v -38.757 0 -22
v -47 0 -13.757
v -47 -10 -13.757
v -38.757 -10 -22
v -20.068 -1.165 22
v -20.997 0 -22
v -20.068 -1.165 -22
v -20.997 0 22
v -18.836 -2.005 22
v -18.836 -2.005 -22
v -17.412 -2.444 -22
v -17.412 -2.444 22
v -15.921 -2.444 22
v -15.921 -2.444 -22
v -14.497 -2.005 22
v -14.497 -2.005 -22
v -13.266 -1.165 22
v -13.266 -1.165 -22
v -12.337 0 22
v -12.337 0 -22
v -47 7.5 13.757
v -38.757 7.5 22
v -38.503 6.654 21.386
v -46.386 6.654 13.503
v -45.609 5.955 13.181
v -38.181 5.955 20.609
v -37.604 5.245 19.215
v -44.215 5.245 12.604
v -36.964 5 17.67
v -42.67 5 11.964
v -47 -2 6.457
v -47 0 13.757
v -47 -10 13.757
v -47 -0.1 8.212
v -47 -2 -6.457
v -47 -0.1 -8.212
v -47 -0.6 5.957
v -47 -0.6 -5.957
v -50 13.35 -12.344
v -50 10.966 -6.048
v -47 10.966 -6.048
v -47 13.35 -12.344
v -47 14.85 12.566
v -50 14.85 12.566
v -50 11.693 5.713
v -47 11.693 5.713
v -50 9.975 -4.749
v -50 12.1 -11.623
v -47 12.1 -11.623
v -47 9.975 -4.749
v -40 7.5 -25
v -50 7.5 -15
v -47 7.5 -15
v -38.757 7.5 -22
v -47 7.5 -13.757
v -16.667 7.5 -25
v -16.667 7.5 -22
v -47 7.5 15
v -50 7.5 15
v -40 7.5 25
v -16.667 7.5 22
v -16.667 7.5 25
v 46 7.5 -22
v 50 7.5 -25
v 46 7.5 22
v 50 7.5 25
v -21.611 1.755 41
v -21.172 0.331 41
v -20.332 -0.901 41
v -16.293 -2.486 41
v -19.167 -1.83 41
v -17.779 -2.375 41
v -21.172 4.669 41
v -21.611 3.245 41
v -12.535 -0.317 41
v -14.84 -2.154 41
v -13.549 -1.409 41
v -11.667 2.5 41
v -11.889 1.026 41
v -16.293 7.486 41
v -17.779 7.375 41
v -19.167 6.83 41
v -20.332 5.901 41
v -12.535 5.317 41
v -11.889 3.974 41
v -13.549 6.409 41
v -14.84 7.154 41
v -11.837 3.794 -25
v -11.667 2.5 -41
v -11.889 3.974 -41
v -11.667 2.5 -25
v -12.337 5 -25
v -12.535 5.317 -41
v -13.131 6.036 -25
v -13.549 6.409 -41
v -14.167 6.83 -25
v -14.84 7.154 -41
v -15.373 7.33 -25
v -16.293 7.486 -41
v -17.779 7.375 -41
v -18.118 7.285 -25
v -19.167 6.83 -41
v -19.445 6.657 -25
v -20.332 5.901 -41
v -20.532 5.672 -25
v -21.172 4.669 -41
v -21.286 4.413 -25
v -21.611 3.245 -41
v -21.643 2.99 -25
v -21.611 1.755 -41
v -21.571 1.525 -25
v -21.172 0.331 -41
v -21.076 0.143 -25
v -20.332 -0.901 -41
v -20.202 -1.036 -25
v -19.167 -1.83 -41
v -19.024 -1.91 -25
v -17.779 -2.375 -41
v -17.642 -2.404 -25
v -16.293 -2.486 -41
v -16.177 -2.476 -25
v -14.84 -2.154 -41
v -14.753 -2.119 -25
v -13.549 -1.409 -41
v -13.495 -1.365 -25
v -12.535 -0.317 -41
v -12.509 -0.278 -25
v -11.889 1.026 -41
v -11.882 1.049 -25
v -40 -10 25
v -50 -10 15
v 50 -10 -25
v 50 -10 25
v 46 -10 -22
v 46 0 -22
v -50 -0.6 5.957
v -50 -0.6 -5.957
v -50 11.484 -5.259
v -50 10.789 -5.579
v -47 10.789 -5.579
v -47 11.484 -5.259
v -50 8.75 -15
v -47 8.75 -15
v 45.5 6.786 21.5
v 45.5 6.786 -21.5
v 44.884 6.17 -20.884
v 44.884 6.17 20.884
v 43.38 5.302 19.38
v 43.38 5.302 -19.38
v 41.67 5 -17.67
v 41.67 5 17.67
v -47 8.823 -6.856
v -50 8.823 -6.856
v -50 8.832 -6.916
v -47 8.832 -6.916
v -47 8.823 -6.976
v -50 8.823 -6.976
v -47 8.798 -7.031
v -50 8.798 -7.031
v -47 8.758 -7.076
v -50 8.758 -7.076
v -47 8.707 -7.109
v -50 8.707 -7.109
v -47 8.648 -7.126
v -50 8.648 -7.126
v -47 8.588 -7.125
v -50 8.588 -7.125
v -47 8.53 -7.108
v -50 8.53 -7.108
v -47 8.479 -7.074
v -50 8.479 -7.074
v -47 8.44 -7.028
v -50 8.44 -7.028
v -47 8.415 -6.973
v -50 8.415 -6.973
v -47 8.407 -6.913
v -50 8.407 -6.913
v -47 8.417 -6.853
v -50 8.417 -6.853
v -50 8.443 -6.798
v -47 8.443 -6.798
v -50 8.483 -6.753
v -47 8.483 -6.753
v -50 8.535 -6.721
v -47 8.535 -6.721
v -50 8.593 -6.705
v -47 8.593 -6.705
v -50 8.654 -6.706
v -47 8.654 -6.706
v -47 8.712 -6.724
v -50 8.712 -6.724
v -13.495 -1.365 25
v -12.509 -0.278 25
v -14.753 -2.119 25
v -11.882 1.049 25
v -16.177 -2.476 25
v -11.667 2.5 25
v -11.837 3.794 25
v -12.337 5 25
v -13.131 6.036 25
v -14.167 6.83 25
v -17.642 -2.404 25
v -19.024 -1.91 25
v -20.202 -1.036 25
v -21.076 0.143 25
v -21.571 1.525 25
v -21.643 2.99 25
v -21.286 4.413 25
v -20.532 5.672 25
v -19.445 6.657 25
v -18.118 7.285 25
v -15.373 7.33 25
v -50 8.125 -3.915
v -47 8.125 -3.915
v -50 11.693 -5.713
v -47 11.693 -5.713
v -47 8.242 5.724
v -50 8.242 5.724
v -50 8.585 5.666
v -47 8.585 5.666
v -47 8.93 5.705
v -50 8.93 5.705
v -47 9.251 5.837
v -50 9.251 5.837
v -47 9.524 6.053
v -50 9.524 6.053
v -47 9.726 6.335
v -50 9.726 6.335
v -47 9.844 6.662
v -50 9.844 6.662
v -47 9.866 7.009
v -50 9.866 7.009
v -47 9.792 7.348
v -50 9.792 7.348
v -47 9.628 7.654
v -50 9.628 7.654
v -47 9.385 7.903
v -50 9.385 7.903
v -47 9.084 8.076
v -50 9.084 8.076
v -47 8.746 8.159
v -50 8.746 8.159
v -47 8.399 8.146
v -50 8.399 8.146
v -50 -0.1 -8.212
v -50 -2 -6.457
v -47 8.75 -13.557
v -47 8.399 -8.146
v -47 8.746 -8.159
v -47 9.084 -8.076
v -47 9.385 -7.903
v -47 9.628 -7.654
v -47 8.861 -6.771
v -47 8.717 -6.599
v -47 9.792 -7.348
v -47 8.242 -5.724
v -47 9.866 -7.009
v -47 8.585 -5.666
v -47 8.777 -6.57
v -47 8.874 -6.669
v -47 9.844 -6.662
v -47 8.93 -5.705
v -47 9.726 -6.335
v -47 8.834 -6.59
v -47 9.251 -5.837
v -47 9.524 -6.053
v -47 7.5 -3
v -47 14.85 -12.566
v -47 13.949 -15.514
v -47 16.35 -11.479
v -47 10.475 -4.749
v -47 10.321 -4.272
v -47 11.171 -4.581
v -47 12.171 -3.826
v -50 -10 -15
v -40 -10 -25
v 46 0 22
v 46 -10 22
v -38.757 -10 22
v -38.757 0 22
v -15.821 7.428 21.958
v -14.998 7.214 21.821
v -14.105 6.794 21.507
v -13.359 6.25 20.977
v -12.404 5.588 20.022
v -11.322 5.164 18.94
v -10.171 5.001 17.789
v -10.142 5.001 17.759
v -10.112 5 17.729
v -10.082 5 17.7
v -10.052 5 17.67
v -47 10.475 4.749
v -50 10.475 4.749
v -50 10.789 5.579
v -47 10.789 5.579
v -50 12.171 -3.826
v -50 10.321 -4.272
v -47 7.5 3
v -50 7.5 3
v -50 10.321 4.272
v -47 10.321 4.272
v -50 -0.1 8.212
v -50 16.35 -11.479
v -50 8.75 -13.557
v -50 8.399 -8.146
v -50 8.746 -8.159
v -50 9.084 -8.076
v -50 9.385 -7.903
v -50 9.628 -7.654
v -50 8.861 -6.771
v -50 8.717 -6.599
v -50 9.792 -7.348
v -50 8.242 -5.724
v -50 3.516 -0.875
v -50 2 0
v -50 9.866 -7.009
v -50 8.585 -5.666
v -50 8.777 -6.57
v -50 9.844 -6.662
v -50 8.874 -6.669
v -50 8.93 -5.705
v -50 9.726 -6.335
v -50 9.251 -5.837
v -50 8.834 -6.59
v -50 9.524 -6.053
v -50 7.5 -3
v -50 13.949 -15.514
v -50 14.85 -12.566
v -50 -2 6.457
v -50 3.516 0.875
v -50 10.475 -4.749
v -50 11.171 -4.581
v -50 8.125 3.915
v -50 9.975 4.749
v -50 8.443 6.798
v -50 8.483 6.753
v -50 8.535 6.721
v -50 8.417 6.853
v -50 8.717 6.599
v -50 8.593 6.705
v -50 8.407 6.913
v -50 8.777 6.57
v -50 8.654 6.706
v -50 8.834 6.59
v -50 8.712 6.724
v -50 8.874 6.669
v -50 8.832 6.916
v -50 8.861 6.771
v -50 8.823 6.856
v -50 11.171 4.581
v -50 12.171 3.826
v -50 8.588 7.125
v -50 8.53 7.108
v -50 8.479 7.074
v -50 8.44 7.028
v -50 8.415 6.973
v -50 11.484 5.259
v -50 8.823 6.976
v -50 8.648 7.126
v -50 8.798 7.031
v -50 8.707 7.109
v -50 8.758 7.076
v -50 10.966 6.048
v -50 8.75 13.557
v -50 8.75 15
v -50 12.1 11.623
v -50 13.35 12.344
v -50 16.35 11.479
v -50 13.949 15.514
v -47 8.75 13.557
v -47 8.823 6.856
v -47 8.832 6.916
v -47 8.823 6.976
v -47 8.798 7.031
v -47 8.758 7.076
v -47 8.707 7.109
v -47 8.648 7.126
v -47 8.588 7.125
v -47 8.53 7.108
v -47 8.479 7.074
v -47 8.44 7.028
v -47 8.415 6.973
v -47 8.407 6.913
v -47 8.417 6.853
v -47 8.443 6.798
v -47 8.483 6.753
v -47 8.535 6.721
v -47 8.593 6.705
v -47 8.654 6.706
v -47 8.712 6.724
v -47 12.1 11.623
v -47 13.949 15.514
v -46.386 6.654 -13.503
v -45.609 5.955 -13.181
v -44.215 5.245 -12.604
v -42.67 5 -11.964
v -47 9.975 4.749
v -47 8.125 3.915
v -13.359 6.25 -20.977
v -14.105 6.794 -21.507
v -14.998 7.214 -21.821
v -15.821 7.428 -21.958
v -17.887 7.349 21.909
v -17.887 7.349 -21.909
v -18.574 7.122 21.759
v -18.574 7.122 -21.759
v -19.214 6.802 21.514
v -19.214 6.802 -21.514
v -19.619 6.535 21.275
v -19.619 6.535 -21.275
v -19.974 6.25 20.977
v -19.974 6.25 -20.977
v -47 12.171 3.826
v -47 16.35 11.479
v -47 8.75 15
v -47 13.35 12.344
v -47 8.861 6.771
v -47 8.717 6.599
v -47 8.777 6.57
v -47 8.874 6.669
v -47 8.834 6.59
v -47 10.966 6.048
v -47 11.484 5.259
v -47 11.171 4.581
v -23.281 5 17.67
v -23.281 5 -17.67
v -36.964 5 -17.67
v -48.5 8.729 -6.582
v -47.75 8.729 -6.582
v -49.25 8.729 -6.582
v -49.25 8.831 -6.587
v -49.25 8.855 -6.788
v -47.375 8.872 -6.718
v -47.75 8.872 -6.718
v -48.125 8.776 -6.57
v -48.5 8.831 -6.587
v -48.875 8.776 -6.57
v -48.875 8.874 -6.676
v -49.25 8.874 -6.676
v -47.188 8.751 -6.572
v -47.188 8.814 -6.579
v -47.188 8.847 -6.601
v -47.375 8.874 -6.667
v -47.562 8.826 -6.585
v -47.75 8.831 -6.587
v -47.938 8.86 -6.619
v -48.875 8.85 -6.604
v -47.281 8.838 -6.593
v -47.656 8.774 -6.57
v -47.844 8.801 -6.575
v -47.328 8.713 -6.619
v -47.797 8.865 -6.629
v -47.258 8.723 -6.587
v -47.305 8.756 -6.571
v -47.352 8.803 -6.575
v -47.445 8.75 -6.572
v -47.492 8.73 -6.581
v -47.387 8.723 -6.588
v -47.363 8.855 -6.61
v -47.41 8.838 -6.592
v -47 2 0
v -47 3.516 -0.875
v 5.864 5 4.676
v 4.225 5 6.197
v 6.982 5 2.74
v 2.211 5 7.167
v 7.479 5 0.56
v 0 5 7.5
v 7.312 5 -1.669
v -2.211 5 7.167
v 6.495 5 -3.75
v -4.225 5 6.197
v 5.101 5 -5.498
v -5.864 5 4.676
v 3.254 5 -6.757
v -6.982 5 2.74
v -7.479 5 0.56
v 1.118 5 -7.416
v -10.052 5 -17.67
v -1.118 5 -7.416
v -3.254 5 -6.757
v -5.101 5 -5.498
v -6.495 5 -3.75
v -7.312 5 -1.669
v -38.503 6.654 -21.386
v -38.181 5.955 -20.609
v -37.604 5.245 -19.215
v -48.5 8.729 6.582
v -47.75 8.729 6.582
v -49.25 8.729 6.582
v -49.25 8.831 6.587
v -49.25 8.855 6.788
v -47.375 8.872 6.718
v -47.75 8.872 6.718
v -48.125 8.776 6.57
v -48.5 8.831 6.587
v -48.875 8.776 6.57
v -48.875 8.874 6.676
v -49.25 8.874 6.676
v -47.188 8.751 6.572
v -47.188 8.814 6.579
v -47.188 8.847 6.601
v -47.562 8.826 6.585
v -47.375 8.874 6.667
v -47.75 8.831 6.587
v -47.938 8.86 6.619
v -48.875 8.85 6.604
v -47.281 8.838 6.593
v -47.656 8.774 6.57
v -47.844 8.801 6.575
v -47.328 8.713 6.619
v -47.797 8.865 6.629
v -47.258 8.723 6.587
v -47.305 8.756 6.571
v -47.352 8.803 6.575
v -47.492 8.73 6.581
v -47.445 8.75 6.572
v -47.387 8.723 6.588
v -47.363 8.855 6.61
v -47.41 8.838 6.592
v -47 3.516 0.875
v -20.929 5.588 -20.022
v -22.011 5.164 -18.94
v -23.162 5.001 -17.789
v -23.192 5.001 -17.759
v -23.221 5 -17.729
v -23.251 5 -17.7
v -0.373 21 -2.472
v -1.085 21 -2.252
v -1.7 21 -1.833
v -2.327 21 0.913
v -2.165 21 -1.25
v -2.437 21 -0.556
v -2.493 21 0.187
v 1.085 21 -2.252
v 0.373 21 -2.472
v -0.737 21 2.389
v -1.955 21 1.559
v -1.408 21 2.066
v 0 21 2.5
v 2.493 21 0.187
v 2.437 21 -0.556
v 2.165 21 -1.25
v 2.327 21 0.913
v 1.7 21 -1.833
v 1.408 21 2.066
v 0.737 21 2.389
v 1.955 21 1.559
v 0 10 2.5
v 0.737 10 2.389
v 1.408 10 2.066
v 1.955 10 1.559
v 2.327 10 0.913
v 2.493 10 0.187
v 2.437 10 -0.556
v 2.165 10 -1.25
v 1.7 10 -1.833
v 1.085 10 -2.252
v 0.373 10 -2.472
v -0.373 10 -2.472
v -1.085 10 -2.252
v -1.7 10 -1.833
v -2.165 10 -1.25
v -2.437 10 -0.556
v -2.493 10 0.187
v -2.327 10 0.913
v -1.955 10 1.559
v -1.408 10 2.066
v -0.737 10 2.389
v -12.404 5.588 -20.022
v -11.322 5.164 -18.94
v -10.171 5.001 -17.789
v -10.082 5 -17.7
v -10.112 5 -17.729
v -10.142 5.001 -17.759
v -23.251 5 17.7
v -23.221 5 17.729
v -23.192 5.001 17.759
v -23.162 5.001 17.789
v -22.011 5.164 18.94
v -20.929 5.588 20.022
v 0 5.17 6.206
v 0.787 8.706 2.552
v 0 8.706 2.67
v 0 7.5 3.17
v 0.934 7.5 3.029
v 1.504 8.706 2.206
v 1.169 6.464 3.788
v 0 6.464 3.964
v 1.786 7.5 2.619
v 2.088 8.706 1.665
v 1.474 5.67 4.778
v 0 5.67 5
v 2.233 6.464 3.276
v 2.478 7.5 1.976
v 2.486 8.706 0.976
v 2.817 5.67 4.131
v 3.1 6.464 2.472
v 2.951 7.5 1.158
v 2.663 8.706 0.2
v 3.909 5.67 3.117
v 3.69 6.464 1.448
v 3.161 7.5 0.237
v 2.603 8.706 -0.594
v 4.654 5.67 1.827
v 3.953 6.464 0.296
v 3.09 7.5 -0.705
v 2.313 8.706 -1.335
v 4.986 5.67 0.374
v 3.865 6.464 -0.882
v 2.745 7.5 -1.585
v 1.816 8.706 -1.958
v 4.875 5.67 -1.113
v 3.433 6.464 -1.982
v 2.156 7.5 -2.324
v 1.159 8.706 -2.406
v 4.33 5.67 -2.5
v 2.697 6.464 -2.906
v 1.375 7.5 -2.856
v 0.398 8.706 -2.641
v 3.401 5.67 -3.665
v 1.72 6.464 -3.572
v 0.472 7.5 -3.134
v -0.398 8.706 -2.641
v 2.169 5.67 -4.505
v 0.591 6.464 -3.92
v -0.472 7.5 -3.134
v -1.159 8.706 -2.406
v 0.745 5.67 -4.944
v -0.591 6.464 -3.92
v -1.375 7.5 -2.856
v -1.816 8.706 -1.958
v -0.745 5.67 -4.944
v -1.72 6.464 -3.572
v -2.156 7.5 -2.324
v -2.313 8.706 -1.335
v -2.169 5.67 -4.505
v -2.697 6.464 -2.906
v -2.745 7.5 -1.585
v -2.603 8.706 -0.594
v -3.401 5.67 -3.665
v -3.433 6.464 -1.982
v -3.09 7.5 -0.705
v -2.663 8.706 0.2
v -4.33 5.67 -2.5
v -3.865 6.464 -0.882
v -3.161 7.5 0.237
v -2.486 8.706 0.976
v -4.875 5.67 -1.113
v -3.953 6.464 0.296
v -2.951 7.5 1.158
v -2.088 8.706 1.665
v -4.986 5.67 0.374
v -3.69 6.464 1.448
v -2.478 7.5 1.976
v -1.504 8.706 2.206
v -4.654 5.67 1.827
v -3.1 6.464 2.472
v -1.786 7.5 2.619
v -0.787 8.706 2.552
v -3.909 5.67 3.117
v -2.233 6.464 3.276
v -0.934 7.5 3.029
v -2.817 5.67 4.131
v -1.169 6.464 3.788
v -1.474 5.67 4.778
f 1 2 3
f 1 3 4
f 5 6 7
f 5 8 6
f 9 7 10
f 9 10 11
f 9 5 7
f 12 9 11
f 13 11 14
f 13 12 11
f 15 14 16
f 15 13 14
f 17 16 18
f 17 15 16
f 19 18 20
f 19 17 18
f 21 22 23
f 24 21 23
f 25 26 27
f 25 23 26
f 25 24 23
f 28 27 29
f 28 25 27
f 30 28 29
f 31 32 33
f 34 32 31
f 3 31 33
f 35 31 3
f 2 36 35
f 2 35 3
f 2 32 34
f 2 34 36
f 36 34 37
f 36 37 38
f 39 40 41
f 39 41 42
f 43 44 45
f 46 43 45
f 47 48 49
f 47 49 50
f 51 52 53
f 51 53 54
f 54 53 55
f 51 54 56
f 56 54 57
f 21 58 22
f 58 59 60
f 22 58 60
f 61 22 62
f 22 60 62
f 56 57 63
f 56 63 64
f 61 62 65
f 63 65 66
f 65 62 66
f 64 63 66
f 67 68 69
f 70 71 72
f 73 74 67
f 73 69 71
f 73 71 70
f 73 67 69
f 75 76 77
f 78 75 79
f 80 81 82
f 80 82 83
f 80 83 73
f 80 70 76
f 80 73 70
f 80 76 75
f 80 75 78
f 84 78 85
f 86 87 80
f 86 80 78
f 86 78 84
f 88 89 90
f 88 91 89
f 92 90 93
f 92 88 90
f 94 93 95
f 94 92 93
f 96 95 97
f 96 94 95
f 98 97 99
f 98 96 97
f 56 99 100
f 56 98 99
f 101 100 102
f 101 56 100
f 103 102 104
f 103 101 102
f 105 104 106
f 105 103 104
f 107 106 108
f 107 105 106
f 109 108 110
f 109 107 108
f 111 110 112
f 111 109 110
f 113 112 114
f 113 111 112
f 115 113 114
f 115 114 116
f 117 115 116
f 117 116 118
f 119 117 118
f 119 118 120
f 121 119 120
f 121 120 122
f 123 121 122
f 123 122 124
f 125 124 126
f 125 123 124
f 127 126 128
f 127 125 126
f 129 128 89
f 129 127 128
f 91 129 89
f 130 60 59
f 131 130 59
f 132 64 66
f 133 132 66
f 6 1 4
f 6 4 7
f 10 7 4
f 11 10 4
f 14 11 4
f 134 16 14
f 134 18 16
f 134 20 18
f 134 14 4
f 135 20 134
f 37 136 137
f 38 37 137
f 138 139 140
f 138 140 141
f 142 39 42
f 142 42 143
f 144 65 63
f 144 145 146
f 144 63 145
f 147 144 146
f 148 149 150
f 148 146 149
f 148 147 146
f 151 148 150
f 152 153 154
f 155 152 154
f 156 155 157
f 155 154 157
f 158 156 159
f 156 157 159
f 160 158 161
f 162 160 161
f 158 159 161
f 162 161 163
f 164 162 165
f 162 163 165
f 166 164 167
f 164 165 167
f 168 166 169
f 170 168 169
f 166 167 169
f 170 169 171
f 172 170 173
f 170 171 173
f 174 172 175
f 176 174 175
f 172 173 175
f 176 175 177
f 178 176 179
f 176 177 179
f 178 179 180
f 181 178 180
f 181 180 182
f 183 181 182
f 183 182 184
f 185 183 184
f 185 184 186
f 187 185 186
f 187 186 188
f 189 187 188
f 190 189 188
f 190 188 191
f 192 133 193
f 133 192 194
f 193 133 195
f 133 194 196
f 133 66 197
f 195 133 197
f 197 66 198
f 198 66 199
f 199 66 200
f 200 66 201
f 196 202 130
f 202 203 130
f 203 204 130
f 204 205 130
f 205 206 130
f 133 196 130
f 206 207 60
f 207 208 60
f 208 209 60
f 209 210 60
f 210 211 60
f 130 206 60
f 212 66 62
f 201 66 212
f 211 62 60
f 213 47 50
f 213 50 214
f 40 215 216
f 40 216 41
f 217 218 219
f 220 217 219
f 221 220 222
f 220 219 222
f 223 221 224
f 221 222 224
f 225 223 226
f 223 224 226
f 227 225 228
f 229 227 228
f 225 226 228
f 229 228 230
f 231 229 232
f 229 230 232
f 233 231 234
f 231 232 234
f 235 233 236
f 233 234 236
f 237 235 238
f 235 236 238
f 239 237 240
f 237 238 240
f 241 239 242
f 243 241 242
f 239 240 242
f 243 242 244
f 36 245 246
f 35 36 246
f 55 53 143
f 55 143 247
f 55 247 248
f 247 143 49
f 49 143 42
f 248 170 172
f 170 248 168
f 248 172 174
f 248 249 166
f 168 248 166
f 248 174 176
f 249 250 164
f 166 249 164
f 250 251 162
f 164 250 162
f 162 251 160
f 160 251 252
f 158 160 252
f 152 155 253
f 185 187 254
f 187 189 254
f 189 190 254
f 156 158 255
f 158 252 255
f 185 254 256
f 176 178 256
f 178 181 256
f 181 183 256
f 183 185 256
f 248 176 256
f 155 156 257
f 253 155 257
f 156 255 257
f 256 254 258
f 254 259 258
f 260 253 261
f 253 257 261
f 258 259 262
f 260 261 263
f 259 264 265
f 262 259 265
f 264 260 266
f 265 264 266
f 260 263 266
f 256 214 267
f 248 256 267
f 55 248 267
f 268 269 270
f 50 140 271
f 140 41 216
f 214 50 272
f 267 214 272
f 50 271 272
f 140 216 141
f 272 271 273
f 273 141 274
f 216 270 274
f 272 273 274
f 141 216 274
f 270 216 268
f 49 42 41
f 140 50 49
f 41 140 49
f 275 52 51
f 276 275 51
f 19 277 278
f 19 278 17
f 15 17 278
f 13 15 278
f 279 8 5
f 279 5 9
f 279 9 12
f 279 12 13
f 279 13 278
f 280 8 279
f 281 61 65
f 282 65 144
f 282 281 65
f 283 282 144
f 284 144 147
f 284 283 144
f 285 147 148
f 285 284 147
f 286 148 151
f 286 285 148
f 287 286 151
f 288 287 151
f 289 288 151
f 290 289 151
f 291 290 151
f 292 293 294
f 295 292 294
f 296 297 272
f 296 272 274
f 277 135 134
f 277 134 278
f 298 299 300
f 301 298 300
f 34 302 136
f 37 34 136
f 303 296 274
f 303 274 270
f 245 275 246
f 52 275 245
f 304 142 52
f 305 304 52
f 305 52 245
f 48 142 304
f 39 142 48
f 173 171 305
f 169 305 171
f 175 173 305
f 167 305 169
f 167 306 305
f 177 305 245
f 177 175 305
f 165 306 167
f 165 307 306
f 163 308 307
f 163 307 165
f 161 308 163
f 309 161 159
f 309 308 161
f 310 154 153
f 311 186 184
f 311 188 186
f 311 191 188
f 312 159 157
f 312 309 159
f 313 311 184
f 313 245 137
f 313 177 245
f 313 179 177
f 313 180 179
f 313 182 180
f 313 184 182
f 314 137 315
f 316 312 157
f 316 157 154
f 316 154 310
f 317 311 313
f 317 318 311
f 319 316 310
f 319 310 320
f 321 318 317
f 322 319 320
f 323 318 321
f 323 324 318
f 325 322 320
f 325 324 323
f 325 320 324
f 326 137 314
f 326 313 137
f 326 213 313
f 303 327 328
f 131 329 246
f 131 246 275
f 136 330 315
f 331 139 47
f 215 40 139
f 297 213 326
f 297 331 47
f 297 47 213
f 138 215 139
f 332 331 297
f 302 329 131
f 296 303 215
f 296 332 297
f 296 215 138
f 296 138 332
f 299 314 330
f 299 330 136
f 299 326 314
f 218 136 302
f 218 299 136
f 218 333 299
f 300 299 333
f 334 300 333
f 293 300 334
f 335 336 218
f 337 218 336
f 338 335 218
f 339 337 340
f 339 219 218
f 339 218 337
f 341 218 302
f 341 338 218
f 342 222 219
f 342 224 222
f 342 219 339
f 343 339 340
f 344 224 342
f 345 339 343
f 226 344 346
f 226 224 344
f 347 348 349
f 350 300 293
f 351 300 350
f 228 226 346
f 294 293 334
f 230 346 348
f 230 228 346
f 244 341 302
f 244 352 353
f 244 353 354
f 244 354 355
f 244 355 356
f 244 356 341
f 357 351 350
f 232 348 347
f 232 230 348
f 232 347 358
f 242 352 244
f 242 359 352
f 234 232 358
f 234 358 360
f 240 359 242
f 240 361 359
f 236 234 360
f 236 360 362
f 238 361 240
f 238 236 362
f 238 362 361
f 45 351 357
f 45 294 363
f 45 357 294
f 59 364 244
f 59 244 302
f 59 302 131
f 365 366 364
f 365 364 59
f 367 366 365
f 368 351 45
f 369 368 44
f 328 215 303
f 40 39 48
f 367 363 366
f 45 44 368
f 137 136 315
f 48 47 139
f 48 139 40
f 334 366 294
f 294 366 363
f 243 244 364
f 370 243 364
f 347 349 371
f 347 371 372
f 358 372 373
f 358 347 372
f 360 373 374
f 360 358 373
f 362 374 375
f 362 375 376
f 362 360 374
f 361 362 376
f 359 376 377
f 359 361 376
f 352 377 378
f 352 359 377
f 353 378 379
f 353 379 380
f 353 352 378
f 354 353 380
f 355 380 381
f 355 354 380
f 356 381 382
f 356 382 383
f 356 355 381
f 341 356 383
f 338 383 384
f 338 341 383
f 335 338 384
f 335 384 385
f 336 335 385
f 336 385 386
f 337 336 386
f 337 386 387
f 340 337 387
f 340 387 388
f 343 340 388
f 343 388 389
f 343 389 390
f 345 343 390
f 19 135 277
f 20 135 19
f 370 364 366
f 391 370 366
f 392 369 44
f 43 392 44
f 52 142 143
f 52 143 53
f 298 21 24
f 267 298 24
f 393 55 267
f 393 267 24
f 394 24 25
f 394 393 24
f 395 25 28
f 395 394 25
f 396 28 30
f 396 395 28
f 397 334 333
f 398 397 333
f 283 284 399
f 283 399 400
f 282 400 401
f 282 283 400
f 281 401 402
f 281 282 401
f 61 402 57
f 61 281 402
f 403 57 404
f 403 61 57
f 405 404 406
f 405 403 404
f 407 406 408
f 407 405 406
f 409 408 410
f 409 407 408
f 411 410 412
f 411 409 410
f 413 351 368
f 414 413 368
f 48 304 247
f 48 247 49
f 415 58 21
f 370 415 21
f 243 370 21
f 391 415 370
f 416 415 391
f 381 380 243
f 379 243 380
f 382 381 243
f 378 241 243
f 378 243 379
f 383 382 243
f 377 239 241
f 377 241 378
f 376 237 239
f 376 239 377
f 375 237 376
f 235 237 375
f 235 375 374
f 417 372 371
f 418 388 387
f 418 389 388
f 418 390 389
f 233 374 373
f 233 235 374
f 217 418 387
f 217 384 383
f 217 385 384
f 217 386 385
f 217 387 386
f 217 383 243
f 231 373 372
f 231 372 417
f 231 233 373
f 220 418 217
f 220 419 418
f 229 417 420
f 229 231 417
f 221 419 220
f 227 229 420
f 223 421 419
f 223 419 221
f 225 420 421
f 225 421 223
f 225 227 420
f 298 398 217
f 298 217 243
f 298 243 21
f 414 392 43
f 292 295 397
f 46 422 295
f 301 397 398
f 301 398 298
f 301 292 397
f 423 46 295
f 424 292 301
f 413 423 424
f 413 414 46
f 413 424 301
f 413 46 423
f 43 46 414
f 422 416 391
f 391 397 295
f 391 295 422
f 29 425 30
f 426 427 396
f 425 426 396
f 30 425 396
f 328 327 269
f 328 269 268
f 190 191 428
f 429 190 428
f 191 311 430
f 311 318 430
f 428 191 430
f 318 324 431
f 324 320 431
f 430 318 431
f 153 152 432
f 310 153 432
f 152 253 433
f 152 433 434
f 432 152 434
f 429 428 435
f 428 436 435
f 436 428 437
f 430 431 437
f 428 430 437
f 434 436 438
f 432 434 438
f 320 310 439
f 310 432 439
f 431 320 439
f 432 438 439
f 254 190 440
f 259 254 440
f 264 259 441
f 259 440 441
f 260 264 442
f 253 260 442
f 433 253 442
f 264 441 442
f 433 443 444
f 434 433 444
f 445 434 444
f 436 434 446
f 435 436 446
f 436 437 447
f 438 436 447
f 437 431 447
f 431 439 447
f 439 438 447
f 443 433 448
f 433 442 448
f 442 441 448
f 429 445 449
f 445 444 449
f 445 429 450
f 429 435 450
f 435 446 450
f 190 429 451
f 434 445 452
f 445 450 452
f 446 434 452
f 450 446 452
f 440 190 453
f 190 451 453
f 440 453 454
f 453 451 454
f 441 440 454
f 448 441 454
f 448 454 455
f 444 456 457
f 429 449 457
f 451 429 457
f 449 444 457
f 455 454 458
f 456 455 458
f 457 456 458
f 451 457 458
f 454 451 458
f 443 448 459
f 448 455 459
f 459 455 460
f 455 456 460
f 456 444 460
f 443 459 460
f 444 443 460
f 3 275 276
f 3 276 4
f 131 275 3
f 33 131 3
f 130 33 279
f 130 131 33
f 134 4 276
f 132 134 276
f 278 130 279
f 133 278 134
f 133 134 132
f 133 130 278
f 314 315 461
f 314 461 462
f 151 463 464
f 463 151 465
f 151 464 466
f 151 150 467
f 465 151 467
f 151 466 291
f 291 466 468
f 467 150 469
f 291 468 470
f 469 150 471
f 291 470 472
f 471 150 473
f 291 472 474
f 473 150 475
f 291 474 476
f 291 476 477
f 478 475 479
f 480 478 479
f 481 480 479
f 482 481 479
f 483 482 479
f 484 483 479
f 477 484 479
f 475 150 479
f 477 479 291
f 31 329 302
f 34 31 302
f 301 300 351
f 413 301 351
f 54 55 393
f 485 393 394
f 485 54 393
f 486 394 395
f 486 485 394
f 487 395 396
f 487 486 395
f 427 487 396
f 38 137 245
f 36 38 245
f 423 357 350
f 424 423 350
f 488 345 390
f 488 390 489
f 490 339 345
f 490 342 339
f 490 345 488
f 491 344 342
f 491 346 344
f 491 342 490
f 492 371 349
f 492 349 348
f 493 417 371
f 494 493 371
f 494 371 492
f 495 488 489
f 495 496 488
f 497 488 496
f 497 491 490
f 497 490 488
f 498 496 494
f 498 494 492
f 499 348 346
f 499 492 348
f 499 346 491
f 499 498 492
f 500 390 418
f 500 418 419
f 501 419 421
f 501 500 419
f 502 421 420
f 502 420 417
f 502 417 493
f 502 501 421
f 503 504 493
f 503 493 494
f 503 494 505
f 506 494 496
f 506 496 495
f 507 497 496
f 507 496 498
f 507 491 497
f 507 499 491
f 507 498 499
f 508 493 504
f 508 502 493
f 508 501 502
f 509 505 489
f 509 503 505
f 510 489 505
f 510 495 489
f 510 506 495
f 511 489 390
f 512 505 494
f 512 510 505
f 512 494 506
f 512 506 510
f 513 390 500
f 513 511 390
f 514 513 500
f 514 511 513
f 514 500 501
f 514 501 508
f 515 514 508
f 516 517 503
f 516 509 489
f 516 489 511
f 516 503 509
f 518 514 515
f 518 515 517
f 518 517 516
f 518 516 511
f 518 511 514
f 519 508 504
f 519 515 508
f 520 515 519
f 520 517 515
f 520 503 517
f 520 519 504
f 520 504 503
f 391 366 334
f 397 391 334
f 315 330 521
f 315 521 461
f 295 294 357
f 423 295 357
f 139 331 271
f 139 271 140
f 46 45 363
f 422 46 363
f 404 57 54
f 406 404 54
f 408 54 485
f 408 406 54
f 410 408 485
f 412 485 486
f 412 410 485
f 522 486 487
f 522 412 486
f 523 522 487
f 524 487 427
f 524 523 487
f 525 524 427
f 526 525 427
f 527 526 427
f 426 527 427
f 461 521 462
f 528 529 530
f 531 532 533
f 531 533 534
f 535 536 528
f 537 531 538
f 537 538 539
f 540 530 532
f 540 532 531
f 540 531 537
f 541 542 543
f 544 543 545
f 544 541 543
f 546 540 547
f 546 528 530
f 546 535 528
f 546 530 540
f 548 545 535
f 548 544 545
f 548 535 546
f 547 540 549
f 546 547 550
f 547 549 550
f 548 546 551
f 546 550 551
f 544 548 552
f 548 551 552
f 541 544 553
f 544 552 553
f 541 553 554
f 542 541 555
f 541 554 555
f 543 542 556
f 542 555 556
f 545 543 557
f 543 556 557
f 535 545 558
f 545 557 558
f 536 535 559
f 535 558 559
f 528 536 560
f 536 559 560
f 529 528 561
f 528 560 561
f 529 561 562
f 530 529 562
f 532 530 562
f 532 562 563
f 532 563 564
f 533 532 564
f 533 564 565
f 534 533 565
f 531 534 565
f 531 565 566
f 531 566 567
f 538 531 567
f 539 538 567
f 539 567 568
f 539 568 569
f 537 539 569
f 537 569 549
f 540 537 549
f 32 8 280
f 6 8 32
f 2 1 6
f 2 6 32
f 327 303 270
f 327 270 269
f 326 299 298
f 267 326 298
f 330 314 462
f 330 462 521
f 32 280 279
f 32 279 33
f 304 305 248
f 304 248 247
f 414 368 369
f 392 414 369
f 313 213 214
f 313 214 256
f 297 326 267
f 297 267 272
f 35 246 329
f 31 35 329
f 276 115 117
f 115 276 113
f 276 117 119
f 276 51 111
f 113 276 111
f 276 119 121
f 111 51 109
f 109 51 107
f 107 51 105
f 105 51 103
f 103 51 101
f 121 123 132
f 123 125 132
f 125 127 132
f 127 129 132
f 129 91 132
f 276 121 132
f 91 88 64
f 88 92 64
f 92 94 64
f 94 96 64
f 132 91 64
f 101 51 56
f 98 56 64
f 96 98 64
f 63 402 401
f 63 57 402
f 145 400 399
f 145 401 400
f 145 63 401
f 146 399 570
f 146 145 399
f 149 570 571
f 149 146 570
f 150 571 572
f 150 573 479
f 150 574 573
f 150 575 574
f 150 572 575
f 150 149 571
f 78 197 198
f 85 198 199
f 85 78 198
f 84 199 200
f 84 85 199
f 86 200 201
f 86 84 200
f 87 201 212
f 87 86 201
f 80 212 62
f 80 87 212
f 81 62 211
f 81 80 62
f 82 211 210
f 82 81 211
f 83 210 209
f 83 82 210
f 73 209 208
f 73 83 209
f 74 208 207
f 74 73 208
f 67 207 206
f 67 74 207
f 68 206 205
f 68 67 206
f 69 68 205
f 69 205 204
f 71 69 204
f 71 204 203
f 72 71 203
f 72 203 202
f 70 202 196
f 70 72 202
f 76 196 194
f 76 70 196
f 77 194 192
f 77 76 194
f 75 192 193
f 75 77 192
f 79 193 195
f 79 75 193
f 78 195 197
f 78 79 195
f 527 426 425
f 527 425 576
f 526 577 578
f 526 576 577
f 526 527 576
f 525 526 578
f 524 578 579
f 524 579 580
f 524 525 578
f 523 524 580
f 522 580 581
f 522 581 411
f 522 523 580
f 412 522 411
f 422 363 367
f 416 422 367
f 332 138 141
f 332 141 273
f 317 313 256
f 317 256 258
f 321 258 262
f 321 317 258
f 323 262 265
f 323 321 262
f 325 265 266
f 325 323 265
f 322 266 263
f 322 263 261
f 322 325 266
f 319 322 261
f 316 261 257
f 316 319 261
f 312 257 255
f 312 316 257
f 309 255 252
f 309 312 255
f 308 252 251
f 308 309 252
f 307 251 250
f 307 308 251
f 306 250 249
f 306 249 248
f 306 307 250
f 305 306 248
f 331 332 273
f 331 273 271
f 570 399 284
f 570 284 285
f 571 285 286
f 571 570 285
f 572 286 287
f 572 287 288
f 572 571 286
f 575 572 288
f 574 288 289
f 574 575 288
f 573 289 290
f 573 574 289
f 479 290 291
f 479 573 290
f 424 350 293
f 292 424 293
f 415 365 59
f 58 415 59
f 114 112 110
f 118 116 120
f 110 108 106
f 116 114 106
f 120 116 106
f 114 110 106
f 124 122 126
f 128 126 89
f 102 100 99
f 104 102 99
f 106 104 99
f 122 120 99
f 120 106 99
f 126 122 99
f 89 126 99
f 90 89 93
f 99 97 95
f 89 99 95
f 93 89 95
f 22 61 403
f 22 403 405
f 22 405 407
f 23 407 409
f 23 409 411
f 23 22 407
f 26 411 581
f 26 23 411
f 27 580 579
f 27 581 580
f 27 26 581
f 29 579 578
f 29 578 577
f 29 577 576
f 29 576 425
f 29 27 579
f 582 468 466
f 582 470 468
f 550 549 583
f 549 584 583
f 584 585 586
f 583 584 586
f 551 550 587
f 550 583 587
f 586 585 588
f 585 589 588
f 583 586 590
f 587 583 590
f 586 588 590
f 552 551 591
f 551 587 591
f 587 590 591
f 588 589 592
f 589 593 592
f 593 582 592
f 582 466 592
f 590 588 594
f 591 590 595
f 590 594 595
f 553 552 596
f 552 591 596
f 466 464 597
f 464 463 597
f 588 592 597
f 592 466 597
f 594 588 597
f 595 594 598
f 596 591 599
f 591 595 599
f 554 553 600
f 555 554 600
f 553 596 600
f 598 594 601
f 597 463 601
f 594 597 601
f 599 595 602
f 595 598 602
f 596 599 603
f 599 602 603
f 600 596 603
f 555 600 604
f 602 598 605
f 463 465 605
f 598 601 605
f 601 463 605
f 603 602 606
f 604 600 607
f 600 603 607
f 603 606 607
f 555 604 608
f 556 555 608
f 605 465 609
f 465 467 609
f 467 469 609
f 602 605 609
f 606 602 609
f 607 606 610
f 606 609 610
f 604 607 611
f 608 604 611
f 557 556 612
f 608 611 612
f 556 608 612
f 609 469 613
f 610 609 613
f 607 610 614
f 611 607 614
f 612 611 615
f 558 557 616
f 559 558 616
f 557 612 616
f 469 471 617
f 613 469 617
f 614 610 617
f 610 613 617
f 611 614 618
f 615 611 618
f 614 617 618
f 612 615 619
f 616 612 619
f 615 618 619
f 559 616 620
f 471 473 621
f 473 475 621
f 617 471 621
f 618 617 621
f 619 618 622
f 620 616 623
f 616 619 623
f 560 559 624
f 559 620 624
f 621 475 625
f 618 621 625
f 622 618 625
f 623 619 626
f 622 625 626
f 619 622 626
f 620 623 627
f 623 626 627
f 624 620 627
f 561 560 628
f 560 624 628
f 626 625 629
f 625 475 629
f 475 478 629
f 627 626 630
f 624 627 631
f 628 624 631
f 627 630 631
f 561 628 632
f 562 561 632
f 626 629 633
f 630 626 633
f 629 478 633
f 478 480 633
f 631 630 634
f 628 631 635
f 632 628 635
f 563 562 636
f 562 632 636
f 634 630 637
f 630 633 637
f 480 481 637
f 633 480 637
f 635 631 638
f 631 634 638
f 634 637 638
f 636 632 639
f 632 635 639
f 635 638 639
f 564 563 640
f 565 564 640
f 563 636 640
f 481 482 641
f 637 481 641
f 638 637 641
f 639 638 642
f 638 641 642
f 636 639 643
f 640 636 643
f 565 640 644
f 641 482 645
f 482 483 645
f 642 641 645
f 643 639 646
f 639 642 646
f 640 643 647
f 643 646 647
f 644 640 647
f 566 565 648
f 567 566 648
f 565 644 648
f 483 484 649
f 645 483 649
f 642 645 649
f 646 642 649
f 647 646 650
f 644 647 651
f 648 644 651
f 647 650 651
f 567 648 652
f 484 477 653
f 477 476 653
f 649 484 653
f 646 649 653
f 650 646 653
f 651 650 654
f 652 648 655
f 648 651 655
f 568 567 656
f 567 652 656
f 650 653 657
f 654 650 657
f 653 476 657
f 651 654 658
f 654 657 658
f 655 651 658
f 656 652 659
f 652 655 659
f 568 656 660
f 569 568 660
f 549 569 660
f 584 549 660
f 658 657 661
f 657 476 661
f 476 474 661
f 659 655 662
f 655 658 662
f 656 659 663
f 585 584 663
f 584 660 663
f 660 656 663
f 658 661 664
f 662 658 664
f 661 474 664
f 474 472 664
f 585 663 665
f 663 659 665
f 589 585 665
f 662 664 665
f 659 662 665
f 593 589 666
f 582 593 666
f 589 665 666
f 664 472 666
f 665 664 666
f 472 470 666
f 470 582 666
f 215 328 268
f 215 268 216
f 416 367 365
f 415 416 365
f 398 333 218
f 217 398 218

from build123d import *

# Parameters (mm, degrees)
SALIENTE_EXTRUIR1_DEPTH       = 5
CROQUIS2_R                    = 5
SALIENTE_EXTRUIR2_DEPTH       = 41
CROQUIS3_R                    = 2.5
SALIENTE_EXTRUIR3_DEPTH       = 16
SALIENTE_EXTRUIR10_DEPTH      = 10
SALIENTE_EXTRUIR10_DEPTH_BACK = 7.5
REDONDEO3_R                   = 5
SALIENTE_EXTRUIR11_DEPTH      = 3
CORTAR_EXTRUIR1_DEPTH         = 3


with BuildPart() as part:
    # Croquis1 → Saliente-Extruir1 (new body)
    with BuildSketch(Plane(origin=(0, 0, 0), x_dir=(1, 0, 0), z_dir=(0, 1, 0))):
        Polygon((-50, 15), (-40, 25), (50, 25), (50, -25), (-40, -25), (-50, -15), align=None)
    extrude(amount=SALIENTE_EXTRUIR1_DEPTH)

    # Croquis2 → Saliente-Extruir2 (add, symmetric)
    with BuildSketch(Plane.XY):
        with Locations((-16.666666667, 2.5)):
            Circle(CROQUIS2_R)
    extrude(amount=SALIENTE_EXTRUIR2_DEPTH, both=True)

    # Croquis3 → Saliente-Extruir3 (add)
    with BuildSketch(Plane(origin=(0, 5, 0), x_dir=(1, 0, 0), z_dir=(0, 1, 0))):
        with Locations(Location((0, 0, 0), (0, 0, 270))):
            Circle(CROQUIS3_R)
    extrude(amount=SALIENTE_EXTRUIR3_DEPTH)

    # Croquis24 → Saliente-Extruir10 (add, two sides: drawn at the far end of the back side and taken through both)
    with BuildSketch(Plane.XZ.offset(-SALIENTE_EXTRUIR10_DEPTH_BACK)):
        Polygon((50, 25), (-40, 25), (-50, 15), (-50, -15), (-40, -25), (50, -25), align=None)
        Polygon((46, 22), (-38.757359313, 22), (-47, 13.757359313), (-47, -13.757359313), (-38.757359313, -22), (46, -22), align=None, mode=Mode.SUBTRACT)
    extrude(amount=SALIENTE_EXTRUIR10_DEPTH + SALIENTE_EXTRUIR10_DEPTH_BACK)

    # Redondeo3
    # the kernel refuses this fillet: 5 mm, written as the material it adds along each edge
    with BuildSketch(Plane(origin=(46, 5, -22), x_dir=(0, 0, 1), z_dir=(-1, 0, 0)), Plane(origin=(-23.161857195, 5, 22), x_dir=(0, 0, -1), z_dir=(1, 0, 0))) as redondeo3_piece_1:
        with BuildLine():
            CenterArc((4.330127019, 5), REDONDEO3_R, 210, 60)
            Line((0, 2.5), (0, 0))
            Line((0, 0), (4.330127019, 0))
        make_face()
    extrude(amount=69.161857195)
    with BuildSketch(Plane(origin=(46, 5, 22), x_dir=(-1, 0, 0), z_dir=(0, 0, -1))) as redondeo3_piece_2:
        with BuildLine():
            CenterArc((4.330127019, 5), REDONDEO3_R, 210, 60)
            Line((0, 2.5), (0, 0))
            Line((0, 0), (4.330127019, 0))
        make_face()
    extrude(amount=44)
    with BuildSketch(Plane(origin=(-20.996793686, 5, -22), x_dir=(-1, 0, 0), z_dir=(0, 0, 1))) as redondeo3_piece_3:
        with BuildLine():
            CenterArc((2.284251259, -5), REDONDEO3_R, 90, 41.409622109)
            ThreePointArc((-1.02293788, -1.25), (-0.460660063, -0.66657946), (0, 0))
            Line((0, 0), (2.284251259, 0))
        make_face()
    extrude(amount=44)
    with BuildSketch(Plane(origin=(-12.336539648, 5, -22), x_dir=(-0.6333158920043388, 0.7738933911946454, 0), z_dir=(0, 0, 1))) as redondeo3_piece_4:
        with BuildLine():
            CenterArc((2.422814332, -4.934346413), REDONDEO3_R, 99.295188945, 41.409622109)
            Line((-1.446652623, -1.767766953), (0, 0))
            ThreePointArc((0, 0), (0.807604777, -0.065653587), (1.615209555, 0))
        make_face()
    extrude(amount=44)
    with BuildSketch(Plane(origin=(-49.58267686, 5, 22), x_dir=(0, 0, -1), z_dir=(1, 0, 0))) as redondeo3_piece_5_section:
        with BuildLine():
            CenterArc((4.330127019, 5), REDONDEO3_R, 210, 60)
            Line((0, 2.5), (0, 0))
            Line((0, 0), (4.330127019, 0))
        make_face()
    redondeo3_piece_5 = extrude(amount=39.411200722, mode=Mode.PRIVATE)
    redondeo3_piece_5 = split(redondeo3_piece_5, bisect_by=Plane(origin=(-35.229781416, 5.661212727, 25.527577897), z_dir=(0.7071067811865477, 0, -0.7071067811865475)), keep=Keep.TOP, mode=Mode.PRIVATE)
    add(redondeo3_piece_5)
    with BuildSketch(Plane(origin=(-54.654655446, 5, 6.102703867), x_dir=(0, 1, 0), z_dir=(0.7071067811865475, 0, 0.7071067811865477))) as redondeo3_piece_6_section:
        with BuildLine():
            CenterArc((5, -4.330127019), REDONDEO3_R, 120, 60)
            Line((0, -4.330127019), (0, 0))
            Line((0, 0), (2.5, 0))
        make_face()
    redondeo3_piece_6 = extrude(amount=33.307489344, mode=Mode.PRIVATE)
    redondeo3_piece_6 = split(redondeo3_piece_6, bisect_by=Plane(origin=(-47, 5.661212727, 16.588119965), z_dir=(1, 0, 0)), keep=Keep.TOP, mode=Mode.PRIVATE)
    redondeo3_piece_6 = split(redondeo3_piece_6, bisect_by=Plane(origin=(-41.588119965, 5.661212727, 22), z_dir=(0, 0, -1)), keep=Keep.TOP, mode=Mode.PRIVATE)
    add(redondeo3_piece_6)
    with BuildSketch(Plane(origin=(-47, 5, -24.58267686), x_dir=(1, 0, 0), z_dir=(0, 0, 1))) as redondeo3_piece_7_section:
        with BuildLine():
            CenterArc((4.330127019, 5), REDONDEO3_R, 210, 60)
            Line((0, 2.5), (0, 0))
            Line((0, 0), (4.330127019, 0))
        make_face()
    redondeo3_piece_7 = extrude(amount=49.16535372, mode=Mode.PRIVATE)
    redondeo3_piece_7 = split(redondeo3_piece_7, bisect_by=Plane(origin=(-52.966116147, 5.661212727, 7.791243166), z_dir=(0.7071067811865477, 0, -0.7071067811865475)), keep=Keep.TOP, mode=Mode.PRIVATE)
    redondeo3_piece_7 = split(redondeo3_piece_7, bisect_by=Plane(origin=(-52.966116147, 5.661212727, -7.791243166), z_dir=(0.7071067811865477, 0, 0.7071067811865474)), keep=Keep.TOP, mode=Mode.PRIVATE)
    add(redondeo3_piece_7)
    with BuildSketch(Plane(origin=(-31.102703867, 5, -29.654655446), x_dir=(0.7071067811865478, 0, 0.7071067811865474), z_dir=(-0.7071067811865474, 0, 0.7071067811865477))) as redondeo3_piece_8_section:
        with BuildLine():
            CenterArc((4.330127019, 5), REDONDEO3_R, 210, 60)
            Line((0, 2.5), (0, 0))
            Line((0, 0), (4.330127019, 0))
        make_face()
    redondeo3_piece_8 = extrude(amount=33.307489344, mode=Mode.PRIVATE)
    redondeo3_piece_8 = split(redondeo3_piece_8, bisect_by=Plane(origin=(-47, 5.661212727, -16.588119965), z_dir=(1, 0, 0)), keep=Keep.TOP, mode=Mode.PRIVATE)
    redondeo3_piece_8 = split(redondeo3_piece_8, bisect_by=Plane(origin=(-41.588119965, 5.661212727, -22), z_dir=(0, 0, 1)), keep=Keep.TOP, mode=Mode.PRIVATE)
    add(redondeo3_piece_8)
    with BuildSketch(Plane(origin=(-10.171476138, 5, -22), x_dir=(0, 0, 1), z_dir=(-1, 0, 0))) as redondeo3_piece_9_section:
        with BuildLine():
            CenterArc((4.330127019, 5), REDONDEO3_R, 210, 60)
            Line((0, 2.5), (0, 0))
            Line((0, 0), (4.330127019, 0))
        make_face()
    redondeo3_piece_9 = extrude(amount=39.411200722, mode=Mode.PRIVATE)
    redondeo3_piece_9 = split(redondeo3_piece_9, bisect_by=Plane(origin=(-26.735758427, 5.066113157, -34.021600886), z_dir=(0.7071067811865477, 0, 0.7071067811865474)), keep=Keep.TOP, mode=Mode.PRIVATE)
    add(redondeo3_piece_9)
    with BuildSketch(Plane(origin=(0, 5, 0), x_dir=(0, 0, 1), z_dir=(-1, 0, 0))) as redondeo3_piece_10:
        with BuildLine():
            CenterArc((2.5 + REDONDEO3_R, REDONDEO3_R), REDONDEO3_R, 180, 90)
            Line((2.5, REDONDEO3_R), (2.5, 0))
            Line((2.5, 0), (2.5 + REDONDEO3_R, 0))
        make_face()
    revolve(axis=Axis((0, 5, 0), (0, 1, 0)))

    # Croquis25 → Saliente-Extruir11 (add)
    # profile 1 of 2: a face of its own
    with BuildSketch(Plane.ZY.offset(50)):
        Polygon((-3, 7.5), (-4.271961203, 10.321467355), (-3.825834184, 12.171467355), (-11.478733088, 16.349678992), (-15.514093965, 13.949275268), (-12.566054552, 14.849678992), (-5.713025242, 11.692794832), (-6.047742661, 10.966183347), (-12.344374095, 13.349678992), (-15, 8.75), (-15, 7.5), align=None)
        Polygon((-5.258893064, 11.483596445), (-4.581316792, 11.171467355), (-4.749343557, 10.474693788), (-5.578981907, 10.788740976), align=None, mode=Mode.SUBTRACT)
        with BuildLine():
            Line((-13.556624327, 8.75), (-11.622686259, 12.099678992))
            Line((-11.622686259, 12.099678992), (-4.749343557, 9.974693788))
            Line((-4.749343557, 9.974693788), (-3.915472936, 8.125))
            Line((-3.915472936, 8.125), (-5.723760223, 8.242224542))
            ThreePointArc((-5.723760223, 8.242224542), (-6.834609816, 9.866860567), (-8.145918644, 8.399244067))
            Line((-8.145918644, 8.399244067), (-13.556624327, 8.75))
        make_face(mode=Mode.SUBTRACT)
        with BuildLine():
            ThreePointArc((-6.85573604, 8.822987446), (-7.052684855, 8.457747166), (-6.724418166, 8.711578367))
            add(Edge.make_bspline(
                [(-6.724418166, 8.711578367), (-6.676833807, 8.722274165), (-6.55662927, 8.681929546), (-6.577709986, 8.898272332), (-6.753765056, 8.872588077), (-6.835537659, 8.837673257), (-6.85573604, 8.822987446)],
                knots=[0, 0, 0, 0, 0.159221348, 0.274521525, 0.50339388, 0.587777767, 0.587777767, 0.587777767, 0.587777767], degree=3))
        make_face(mode=Mode.SUBTRACT)
    # profile 2 of 2: a face of its own
    with BuildSketch(Plane.ZY.offset(50)):
        Polygon((15, 7.5), (3, 7.5), (4.271961203, 10.321467355), (3.825834184, 12.171467355), (11.478733088, 16.349678992), (15.514093965, 13.949275268), (12.566054552, 14.849678992), (5.713025242, 11.692794832), (6.047742661, 10.966183347), (12.344374095, 13.349678992), (15, 8.75), align=None)
        Polygon((5.258893064, 11.483596445), (4.581316792, 11.171467355), (4.749343557, 10.474693788), (5.578981907, 10.788740976), align=None, mode=Mode.SUBTRACT)
        with BuildLine():
            Line((3.915472936, 8.125), (5.723760223, 8.242224542))
            ThreePointArc((5.723760223, 8.242224542), (6.834609816, 9.866860567), (8.145918644, 8.399244067))
            Line((8.145918644, 8.399244067), (13.556624327, 8.75))
            Line((13.556624327, 8.75), (11.622686259, 12.099678992))
            Line((11.622686259, 12.099678992), (4.749343557, 9.974693788))
            Line((4.749343557, 9.974693788), (3.915472936, 8.125))
        make_face(mode=Mode.SUBTRACT)
        with BuildLine():
            ThreePointArc((6.85573604, 8.822987446), (7.052684855, 8.457747166), (6.724418166, 8.711578367))
            add(Edge.make_bspline(
                [(6.724418166, 8.711578367), (6.676833807, 8.722274165), (6.55662927, 8.681929546), (6.577709986, 8.898272332), (6.753765056, 8.872588077), (6.835537659, 8.837673257), (6.85573604, 8.822987446)],
                knots=[0, 0, 0, 0, 0.159221348, 0.274521525, 0.50339388, 0.587777767, 0.587777767, 0.587777767, 0.587777767], degree=3))
        make_face(mode=Mode.SUBTRACT)
    extrude(amount=-SALIENTE_EXTRUIR11_DEPTH)

    # Croquis26 → Cortar-Extruir1 (cut)
    with BuildSketch(Plane.ZY.offset(50)):
        Polygon((-6.45713592, -2), (6.45713592, -2), (8.212311407, -0.1), (5.95713592, -0.6), (-5.95713592, -0.6), (-8.212311407, -0.1), align=None)
        Polygon((-0.875, 3.515544457), (0.875, 3.515544457), (0, 2), align=None)
    extrude(amount=-CORTAR_EXTRUIR1_DEPTH, mode=Mode.SUBTRACT)


solid = part.part
